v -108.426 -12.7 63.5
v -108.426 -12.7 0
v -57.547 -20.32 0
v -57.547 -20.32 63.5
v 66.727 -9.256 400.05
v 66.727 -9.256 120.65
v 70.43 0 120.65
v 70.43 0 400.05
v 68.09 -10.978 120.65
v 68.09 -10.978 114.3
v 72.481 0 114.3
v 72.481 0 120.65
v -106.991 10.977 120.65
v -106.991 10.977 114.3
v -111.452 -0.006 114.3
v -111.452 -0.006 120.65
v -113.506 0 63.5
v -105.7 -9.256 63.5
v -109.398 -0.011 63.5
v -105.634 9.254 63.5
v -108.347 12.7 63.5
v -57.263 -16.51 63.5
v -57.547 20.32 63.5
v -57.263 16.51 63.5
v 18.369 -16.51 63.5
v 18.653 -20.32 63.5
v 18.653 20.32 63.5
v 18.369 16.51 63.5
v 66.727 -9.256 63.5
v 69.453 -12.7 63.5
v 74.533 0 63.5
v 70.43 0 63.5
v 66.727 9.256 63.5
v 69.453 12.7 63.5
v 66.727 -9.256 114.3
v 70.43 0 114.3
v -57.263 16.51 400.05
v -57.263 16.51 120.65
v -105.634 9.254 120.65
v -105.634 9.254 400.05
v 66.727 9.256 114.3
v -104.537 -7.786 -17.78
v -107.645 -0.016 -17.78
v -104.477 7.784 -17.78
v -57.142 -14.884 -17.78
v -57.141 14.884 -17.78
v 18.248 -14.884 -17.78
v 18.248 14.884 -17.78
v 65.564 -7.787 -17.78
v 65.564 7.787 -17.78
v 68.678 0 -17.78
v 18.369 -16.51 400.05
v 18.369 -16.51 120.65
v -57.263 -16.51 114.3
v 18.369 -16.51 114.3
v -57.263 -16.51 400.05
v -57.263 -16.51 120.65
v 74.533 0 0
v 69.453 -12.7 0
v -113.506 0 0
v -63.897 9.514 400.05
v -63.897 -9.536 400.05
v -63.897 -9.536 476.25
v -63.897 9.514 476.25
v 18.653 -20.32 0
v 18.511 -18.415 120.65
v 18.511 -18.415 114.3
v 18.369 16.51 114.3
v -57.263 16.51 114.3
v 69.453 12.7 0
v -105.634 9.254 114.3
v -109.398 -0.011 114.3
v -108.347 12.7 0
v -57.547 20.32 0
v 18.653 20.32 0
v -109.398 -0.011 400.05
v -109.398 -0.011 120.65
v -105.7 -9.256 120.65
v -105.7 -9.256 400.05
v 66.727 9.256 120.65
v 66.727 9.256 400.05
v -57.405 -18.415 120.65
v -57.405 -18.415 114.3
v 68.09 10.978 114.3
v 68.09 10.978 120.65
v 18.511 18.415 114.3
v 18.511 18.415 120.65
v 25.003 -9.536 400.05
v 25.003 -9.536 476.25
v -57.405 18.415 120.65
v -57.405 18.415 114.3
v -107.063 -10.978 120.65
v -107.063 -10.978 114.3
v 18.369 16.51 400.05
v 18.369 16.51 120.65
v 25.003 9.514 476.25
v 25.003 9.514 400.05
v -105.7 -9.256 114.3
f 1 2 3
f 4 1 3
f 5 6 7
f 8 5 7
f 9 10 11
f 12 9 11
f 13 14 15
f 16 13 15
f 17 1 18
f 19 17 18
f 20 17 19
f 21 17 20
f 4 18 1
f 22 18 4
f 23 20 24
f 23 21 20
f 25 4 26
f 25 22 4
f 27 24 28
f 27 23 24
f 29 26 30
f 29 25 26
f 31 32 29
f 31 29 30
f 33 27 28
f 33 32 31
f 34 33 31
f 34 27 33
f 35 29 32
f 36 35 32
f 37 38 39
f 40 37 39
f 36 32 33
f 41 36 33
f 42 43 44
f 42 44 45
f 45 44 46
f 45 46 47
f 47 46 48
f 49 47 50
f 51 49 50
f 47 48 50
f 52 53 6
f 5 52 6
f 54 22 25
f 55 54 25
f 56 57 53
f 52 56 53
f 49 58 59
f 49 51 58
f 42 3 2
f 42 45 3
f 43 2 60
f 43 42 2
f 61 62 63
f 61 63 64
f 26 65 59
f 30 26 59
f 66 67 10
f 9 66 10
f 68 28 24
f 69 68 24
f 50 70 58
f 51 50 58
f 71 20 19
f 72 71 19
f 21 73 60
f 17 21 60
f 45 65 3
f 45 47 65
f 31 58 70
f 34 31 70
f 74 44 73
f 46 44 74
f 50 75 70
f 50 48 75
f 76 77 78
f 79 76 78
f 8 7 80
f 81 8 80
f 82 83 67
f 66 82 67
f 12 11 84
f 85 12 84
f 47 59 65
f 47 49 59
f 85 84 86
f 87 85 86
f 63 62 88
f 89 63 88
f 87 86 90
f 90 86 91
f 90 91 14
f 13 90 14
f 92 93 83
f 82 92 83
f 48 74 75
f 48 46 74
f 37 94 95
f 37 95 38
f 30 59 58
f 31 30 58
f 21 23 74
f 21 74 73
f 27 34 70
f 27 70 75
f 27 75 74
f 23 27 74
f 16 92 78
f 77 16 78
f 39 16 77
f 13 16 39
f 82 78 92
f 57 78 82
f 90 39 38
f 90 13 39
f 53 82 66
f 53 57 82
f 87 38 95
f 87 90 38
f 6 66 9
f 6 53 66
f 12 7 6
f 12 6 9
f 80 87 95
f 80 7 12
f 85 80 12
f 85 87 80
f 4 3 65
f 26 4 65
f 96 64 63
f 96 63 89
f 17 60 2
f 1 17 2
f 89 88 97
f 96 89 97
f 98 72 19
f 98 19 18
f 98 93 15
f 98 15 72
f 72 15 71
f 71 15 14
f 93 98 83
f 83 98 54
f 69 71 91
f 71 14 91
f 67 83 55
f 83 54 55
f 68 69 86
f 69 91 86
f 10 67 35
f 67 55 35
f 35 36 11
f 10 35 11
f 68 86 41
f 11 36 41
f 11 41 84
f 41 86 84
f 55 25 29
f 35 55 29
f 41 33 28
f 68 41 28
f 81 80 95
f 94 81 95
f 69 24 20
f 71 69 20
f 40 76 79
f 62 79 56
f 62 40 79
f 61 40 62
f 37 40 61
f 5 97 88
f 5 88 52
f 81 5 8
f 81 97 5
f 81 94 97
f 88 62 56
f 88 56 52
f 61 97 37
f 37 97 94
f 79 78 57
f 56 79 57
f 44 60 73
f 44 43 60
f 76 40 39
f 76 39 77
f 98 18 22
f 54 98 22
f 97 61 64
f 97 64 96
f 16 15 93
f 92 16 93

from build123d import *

# Parameters (mm, degrees)
F1_DEPTH  = 63.5
F4_DEPTH  = 17.78
F4_TAPER  = 17
F6_DEPTH  = 50.8
F8_DEPTH  = 6.35
F10_DEPTH = 279.4
F11_W     = 88.9
F11_H     = 19.05
F12_DEPTH = 76.2


with BuildPart() as f1:
    # F0 (on Top) → F1 (new body)
    with BuildSketch(Plane.XY):
        Polygon((-57.5468856689, 20.32), (-108.3468856689, 12.7), (-113.5062576618, 0), (-108.4262576618, -12.7), (-57.5468856689, -20.32), (18.6531143311, -20.32), (69.4531143311, -12.7), (74.5331143311, 0), (69.4531143311, 12.7), (18.6531143311, 20.32), align=None)
    extrude(amount=F1_DEPTH)

    # F3 (on face) → F4 (join)
    with BuildSketch(Plane(origin=(0, 0, 0), x_dir=(1, 0, 0), z_dir=(0, 0, -1))):
        Polygon((-113.5062576618, 0), (-108.3468856689, -12.7), (-57.5468856689, -20.32), (18.6531143311, -20.32), (69.4531143311, -12.7), (74.5331143311, 0), (69.4531143311, 12.7), (18.6531143311, 20.32), (-57.5468856689, 20.32), (-108.4262576618, 12.7), align=None)
        Polygon((-56.9794414883, 12.7), (18.0847933541, 12.7), (64.0011016636, 5.8125537536), (66.326123165, 0), (64.0011016636, -5.8125537536), (18.0847933541, -12.7), (-56.9785646919, -12.7), (-102.921750061, -5.8085221946), (-105.2904326731, 0.0220845566), (-102.9746753651, 5.8114778266), align=None, mode=Mode.SUBTRACT)
        Polygon((64.0011016636, 5.8125537536), (18.0847933541, 12.7), (-56.9794414883, 12.7), (-102.9746753651, 5.8114778266), (-105.2904326731, 0.0220845566), (-102.921750061, -5.8085221946), (-56.9785646919, -12.7), (18.0847933541, -12.7), (64.0011016636, -5.8125537536), (66.326123165, 0), align=None)
    extrude(amount=F4_DEPTH, taper=F4_TAPER)

    # F5 (on face) → F6 (join)
    with BuildSketch(Plane.XY.offset(63.5)):
        Polygon((-105.634317865, 9.2542610973), (-109.3983451675, -0.0110422783), (-105.7004665135, -9.2557389133), (-57.2631635786, -16.51), (18.3689538426, -16.51), (66.7271079974, -9.2562768768), (70.4296187481, 0), (66.7271079974, 9.2562768768), (18.3689538426, 16.51), (-57.2627251804, 16.51), align=None)
    extrude(amount=F6_DEPTH)

    # F7 (on face) → F8 (join)
    with BuildSketch(Plane.XY.offset(114.3)):
        Polygon((-57.4050246237, -18.415), (18.5110340868, -18.415), (68.0901111642, -10.9781384384), (72.4813665396, 0), (68.0901111642, 10.9781384384), (18.5110340868, 18.415), (-57.4048054246, 18.415), (-106.9906017669, 10.9771305487), (-111.4523014147, -0.0055211391), (-107.0633620877, -10.9778694567), align=None)
    extrude(amount=F8_DEPTH)

    # F9 (on face) → F10 (join)
    with BuildSketch(Plane.XY.offset(120.65)):
        Polygon((70.4296187481, 0), (66.7271079974, 9.2562768768), (18.3689538426, 16.51), (-57.2627251804, 16.51), (-105.634317865, 9.2542610973), (-109.3983451675, -0.0110422783), (-105.7004665135, -9.2557389133), (-57.2631635786, -16.51), (18.3689538426, -16.51), (66.7271079974, -9.2562768768), align=None)
    extrude(amount=F10_DEPTH)

    # F11 (on face) → F12 (join)
    with BuildSketch(Plane.XY.offset(400.05)):
        with Locations((-19.4468856689, -0.0110422783)):
            Rectangle(F11_W, F11_H)
    extrude(amount=F12_DEPTH)


solid = f1.part
